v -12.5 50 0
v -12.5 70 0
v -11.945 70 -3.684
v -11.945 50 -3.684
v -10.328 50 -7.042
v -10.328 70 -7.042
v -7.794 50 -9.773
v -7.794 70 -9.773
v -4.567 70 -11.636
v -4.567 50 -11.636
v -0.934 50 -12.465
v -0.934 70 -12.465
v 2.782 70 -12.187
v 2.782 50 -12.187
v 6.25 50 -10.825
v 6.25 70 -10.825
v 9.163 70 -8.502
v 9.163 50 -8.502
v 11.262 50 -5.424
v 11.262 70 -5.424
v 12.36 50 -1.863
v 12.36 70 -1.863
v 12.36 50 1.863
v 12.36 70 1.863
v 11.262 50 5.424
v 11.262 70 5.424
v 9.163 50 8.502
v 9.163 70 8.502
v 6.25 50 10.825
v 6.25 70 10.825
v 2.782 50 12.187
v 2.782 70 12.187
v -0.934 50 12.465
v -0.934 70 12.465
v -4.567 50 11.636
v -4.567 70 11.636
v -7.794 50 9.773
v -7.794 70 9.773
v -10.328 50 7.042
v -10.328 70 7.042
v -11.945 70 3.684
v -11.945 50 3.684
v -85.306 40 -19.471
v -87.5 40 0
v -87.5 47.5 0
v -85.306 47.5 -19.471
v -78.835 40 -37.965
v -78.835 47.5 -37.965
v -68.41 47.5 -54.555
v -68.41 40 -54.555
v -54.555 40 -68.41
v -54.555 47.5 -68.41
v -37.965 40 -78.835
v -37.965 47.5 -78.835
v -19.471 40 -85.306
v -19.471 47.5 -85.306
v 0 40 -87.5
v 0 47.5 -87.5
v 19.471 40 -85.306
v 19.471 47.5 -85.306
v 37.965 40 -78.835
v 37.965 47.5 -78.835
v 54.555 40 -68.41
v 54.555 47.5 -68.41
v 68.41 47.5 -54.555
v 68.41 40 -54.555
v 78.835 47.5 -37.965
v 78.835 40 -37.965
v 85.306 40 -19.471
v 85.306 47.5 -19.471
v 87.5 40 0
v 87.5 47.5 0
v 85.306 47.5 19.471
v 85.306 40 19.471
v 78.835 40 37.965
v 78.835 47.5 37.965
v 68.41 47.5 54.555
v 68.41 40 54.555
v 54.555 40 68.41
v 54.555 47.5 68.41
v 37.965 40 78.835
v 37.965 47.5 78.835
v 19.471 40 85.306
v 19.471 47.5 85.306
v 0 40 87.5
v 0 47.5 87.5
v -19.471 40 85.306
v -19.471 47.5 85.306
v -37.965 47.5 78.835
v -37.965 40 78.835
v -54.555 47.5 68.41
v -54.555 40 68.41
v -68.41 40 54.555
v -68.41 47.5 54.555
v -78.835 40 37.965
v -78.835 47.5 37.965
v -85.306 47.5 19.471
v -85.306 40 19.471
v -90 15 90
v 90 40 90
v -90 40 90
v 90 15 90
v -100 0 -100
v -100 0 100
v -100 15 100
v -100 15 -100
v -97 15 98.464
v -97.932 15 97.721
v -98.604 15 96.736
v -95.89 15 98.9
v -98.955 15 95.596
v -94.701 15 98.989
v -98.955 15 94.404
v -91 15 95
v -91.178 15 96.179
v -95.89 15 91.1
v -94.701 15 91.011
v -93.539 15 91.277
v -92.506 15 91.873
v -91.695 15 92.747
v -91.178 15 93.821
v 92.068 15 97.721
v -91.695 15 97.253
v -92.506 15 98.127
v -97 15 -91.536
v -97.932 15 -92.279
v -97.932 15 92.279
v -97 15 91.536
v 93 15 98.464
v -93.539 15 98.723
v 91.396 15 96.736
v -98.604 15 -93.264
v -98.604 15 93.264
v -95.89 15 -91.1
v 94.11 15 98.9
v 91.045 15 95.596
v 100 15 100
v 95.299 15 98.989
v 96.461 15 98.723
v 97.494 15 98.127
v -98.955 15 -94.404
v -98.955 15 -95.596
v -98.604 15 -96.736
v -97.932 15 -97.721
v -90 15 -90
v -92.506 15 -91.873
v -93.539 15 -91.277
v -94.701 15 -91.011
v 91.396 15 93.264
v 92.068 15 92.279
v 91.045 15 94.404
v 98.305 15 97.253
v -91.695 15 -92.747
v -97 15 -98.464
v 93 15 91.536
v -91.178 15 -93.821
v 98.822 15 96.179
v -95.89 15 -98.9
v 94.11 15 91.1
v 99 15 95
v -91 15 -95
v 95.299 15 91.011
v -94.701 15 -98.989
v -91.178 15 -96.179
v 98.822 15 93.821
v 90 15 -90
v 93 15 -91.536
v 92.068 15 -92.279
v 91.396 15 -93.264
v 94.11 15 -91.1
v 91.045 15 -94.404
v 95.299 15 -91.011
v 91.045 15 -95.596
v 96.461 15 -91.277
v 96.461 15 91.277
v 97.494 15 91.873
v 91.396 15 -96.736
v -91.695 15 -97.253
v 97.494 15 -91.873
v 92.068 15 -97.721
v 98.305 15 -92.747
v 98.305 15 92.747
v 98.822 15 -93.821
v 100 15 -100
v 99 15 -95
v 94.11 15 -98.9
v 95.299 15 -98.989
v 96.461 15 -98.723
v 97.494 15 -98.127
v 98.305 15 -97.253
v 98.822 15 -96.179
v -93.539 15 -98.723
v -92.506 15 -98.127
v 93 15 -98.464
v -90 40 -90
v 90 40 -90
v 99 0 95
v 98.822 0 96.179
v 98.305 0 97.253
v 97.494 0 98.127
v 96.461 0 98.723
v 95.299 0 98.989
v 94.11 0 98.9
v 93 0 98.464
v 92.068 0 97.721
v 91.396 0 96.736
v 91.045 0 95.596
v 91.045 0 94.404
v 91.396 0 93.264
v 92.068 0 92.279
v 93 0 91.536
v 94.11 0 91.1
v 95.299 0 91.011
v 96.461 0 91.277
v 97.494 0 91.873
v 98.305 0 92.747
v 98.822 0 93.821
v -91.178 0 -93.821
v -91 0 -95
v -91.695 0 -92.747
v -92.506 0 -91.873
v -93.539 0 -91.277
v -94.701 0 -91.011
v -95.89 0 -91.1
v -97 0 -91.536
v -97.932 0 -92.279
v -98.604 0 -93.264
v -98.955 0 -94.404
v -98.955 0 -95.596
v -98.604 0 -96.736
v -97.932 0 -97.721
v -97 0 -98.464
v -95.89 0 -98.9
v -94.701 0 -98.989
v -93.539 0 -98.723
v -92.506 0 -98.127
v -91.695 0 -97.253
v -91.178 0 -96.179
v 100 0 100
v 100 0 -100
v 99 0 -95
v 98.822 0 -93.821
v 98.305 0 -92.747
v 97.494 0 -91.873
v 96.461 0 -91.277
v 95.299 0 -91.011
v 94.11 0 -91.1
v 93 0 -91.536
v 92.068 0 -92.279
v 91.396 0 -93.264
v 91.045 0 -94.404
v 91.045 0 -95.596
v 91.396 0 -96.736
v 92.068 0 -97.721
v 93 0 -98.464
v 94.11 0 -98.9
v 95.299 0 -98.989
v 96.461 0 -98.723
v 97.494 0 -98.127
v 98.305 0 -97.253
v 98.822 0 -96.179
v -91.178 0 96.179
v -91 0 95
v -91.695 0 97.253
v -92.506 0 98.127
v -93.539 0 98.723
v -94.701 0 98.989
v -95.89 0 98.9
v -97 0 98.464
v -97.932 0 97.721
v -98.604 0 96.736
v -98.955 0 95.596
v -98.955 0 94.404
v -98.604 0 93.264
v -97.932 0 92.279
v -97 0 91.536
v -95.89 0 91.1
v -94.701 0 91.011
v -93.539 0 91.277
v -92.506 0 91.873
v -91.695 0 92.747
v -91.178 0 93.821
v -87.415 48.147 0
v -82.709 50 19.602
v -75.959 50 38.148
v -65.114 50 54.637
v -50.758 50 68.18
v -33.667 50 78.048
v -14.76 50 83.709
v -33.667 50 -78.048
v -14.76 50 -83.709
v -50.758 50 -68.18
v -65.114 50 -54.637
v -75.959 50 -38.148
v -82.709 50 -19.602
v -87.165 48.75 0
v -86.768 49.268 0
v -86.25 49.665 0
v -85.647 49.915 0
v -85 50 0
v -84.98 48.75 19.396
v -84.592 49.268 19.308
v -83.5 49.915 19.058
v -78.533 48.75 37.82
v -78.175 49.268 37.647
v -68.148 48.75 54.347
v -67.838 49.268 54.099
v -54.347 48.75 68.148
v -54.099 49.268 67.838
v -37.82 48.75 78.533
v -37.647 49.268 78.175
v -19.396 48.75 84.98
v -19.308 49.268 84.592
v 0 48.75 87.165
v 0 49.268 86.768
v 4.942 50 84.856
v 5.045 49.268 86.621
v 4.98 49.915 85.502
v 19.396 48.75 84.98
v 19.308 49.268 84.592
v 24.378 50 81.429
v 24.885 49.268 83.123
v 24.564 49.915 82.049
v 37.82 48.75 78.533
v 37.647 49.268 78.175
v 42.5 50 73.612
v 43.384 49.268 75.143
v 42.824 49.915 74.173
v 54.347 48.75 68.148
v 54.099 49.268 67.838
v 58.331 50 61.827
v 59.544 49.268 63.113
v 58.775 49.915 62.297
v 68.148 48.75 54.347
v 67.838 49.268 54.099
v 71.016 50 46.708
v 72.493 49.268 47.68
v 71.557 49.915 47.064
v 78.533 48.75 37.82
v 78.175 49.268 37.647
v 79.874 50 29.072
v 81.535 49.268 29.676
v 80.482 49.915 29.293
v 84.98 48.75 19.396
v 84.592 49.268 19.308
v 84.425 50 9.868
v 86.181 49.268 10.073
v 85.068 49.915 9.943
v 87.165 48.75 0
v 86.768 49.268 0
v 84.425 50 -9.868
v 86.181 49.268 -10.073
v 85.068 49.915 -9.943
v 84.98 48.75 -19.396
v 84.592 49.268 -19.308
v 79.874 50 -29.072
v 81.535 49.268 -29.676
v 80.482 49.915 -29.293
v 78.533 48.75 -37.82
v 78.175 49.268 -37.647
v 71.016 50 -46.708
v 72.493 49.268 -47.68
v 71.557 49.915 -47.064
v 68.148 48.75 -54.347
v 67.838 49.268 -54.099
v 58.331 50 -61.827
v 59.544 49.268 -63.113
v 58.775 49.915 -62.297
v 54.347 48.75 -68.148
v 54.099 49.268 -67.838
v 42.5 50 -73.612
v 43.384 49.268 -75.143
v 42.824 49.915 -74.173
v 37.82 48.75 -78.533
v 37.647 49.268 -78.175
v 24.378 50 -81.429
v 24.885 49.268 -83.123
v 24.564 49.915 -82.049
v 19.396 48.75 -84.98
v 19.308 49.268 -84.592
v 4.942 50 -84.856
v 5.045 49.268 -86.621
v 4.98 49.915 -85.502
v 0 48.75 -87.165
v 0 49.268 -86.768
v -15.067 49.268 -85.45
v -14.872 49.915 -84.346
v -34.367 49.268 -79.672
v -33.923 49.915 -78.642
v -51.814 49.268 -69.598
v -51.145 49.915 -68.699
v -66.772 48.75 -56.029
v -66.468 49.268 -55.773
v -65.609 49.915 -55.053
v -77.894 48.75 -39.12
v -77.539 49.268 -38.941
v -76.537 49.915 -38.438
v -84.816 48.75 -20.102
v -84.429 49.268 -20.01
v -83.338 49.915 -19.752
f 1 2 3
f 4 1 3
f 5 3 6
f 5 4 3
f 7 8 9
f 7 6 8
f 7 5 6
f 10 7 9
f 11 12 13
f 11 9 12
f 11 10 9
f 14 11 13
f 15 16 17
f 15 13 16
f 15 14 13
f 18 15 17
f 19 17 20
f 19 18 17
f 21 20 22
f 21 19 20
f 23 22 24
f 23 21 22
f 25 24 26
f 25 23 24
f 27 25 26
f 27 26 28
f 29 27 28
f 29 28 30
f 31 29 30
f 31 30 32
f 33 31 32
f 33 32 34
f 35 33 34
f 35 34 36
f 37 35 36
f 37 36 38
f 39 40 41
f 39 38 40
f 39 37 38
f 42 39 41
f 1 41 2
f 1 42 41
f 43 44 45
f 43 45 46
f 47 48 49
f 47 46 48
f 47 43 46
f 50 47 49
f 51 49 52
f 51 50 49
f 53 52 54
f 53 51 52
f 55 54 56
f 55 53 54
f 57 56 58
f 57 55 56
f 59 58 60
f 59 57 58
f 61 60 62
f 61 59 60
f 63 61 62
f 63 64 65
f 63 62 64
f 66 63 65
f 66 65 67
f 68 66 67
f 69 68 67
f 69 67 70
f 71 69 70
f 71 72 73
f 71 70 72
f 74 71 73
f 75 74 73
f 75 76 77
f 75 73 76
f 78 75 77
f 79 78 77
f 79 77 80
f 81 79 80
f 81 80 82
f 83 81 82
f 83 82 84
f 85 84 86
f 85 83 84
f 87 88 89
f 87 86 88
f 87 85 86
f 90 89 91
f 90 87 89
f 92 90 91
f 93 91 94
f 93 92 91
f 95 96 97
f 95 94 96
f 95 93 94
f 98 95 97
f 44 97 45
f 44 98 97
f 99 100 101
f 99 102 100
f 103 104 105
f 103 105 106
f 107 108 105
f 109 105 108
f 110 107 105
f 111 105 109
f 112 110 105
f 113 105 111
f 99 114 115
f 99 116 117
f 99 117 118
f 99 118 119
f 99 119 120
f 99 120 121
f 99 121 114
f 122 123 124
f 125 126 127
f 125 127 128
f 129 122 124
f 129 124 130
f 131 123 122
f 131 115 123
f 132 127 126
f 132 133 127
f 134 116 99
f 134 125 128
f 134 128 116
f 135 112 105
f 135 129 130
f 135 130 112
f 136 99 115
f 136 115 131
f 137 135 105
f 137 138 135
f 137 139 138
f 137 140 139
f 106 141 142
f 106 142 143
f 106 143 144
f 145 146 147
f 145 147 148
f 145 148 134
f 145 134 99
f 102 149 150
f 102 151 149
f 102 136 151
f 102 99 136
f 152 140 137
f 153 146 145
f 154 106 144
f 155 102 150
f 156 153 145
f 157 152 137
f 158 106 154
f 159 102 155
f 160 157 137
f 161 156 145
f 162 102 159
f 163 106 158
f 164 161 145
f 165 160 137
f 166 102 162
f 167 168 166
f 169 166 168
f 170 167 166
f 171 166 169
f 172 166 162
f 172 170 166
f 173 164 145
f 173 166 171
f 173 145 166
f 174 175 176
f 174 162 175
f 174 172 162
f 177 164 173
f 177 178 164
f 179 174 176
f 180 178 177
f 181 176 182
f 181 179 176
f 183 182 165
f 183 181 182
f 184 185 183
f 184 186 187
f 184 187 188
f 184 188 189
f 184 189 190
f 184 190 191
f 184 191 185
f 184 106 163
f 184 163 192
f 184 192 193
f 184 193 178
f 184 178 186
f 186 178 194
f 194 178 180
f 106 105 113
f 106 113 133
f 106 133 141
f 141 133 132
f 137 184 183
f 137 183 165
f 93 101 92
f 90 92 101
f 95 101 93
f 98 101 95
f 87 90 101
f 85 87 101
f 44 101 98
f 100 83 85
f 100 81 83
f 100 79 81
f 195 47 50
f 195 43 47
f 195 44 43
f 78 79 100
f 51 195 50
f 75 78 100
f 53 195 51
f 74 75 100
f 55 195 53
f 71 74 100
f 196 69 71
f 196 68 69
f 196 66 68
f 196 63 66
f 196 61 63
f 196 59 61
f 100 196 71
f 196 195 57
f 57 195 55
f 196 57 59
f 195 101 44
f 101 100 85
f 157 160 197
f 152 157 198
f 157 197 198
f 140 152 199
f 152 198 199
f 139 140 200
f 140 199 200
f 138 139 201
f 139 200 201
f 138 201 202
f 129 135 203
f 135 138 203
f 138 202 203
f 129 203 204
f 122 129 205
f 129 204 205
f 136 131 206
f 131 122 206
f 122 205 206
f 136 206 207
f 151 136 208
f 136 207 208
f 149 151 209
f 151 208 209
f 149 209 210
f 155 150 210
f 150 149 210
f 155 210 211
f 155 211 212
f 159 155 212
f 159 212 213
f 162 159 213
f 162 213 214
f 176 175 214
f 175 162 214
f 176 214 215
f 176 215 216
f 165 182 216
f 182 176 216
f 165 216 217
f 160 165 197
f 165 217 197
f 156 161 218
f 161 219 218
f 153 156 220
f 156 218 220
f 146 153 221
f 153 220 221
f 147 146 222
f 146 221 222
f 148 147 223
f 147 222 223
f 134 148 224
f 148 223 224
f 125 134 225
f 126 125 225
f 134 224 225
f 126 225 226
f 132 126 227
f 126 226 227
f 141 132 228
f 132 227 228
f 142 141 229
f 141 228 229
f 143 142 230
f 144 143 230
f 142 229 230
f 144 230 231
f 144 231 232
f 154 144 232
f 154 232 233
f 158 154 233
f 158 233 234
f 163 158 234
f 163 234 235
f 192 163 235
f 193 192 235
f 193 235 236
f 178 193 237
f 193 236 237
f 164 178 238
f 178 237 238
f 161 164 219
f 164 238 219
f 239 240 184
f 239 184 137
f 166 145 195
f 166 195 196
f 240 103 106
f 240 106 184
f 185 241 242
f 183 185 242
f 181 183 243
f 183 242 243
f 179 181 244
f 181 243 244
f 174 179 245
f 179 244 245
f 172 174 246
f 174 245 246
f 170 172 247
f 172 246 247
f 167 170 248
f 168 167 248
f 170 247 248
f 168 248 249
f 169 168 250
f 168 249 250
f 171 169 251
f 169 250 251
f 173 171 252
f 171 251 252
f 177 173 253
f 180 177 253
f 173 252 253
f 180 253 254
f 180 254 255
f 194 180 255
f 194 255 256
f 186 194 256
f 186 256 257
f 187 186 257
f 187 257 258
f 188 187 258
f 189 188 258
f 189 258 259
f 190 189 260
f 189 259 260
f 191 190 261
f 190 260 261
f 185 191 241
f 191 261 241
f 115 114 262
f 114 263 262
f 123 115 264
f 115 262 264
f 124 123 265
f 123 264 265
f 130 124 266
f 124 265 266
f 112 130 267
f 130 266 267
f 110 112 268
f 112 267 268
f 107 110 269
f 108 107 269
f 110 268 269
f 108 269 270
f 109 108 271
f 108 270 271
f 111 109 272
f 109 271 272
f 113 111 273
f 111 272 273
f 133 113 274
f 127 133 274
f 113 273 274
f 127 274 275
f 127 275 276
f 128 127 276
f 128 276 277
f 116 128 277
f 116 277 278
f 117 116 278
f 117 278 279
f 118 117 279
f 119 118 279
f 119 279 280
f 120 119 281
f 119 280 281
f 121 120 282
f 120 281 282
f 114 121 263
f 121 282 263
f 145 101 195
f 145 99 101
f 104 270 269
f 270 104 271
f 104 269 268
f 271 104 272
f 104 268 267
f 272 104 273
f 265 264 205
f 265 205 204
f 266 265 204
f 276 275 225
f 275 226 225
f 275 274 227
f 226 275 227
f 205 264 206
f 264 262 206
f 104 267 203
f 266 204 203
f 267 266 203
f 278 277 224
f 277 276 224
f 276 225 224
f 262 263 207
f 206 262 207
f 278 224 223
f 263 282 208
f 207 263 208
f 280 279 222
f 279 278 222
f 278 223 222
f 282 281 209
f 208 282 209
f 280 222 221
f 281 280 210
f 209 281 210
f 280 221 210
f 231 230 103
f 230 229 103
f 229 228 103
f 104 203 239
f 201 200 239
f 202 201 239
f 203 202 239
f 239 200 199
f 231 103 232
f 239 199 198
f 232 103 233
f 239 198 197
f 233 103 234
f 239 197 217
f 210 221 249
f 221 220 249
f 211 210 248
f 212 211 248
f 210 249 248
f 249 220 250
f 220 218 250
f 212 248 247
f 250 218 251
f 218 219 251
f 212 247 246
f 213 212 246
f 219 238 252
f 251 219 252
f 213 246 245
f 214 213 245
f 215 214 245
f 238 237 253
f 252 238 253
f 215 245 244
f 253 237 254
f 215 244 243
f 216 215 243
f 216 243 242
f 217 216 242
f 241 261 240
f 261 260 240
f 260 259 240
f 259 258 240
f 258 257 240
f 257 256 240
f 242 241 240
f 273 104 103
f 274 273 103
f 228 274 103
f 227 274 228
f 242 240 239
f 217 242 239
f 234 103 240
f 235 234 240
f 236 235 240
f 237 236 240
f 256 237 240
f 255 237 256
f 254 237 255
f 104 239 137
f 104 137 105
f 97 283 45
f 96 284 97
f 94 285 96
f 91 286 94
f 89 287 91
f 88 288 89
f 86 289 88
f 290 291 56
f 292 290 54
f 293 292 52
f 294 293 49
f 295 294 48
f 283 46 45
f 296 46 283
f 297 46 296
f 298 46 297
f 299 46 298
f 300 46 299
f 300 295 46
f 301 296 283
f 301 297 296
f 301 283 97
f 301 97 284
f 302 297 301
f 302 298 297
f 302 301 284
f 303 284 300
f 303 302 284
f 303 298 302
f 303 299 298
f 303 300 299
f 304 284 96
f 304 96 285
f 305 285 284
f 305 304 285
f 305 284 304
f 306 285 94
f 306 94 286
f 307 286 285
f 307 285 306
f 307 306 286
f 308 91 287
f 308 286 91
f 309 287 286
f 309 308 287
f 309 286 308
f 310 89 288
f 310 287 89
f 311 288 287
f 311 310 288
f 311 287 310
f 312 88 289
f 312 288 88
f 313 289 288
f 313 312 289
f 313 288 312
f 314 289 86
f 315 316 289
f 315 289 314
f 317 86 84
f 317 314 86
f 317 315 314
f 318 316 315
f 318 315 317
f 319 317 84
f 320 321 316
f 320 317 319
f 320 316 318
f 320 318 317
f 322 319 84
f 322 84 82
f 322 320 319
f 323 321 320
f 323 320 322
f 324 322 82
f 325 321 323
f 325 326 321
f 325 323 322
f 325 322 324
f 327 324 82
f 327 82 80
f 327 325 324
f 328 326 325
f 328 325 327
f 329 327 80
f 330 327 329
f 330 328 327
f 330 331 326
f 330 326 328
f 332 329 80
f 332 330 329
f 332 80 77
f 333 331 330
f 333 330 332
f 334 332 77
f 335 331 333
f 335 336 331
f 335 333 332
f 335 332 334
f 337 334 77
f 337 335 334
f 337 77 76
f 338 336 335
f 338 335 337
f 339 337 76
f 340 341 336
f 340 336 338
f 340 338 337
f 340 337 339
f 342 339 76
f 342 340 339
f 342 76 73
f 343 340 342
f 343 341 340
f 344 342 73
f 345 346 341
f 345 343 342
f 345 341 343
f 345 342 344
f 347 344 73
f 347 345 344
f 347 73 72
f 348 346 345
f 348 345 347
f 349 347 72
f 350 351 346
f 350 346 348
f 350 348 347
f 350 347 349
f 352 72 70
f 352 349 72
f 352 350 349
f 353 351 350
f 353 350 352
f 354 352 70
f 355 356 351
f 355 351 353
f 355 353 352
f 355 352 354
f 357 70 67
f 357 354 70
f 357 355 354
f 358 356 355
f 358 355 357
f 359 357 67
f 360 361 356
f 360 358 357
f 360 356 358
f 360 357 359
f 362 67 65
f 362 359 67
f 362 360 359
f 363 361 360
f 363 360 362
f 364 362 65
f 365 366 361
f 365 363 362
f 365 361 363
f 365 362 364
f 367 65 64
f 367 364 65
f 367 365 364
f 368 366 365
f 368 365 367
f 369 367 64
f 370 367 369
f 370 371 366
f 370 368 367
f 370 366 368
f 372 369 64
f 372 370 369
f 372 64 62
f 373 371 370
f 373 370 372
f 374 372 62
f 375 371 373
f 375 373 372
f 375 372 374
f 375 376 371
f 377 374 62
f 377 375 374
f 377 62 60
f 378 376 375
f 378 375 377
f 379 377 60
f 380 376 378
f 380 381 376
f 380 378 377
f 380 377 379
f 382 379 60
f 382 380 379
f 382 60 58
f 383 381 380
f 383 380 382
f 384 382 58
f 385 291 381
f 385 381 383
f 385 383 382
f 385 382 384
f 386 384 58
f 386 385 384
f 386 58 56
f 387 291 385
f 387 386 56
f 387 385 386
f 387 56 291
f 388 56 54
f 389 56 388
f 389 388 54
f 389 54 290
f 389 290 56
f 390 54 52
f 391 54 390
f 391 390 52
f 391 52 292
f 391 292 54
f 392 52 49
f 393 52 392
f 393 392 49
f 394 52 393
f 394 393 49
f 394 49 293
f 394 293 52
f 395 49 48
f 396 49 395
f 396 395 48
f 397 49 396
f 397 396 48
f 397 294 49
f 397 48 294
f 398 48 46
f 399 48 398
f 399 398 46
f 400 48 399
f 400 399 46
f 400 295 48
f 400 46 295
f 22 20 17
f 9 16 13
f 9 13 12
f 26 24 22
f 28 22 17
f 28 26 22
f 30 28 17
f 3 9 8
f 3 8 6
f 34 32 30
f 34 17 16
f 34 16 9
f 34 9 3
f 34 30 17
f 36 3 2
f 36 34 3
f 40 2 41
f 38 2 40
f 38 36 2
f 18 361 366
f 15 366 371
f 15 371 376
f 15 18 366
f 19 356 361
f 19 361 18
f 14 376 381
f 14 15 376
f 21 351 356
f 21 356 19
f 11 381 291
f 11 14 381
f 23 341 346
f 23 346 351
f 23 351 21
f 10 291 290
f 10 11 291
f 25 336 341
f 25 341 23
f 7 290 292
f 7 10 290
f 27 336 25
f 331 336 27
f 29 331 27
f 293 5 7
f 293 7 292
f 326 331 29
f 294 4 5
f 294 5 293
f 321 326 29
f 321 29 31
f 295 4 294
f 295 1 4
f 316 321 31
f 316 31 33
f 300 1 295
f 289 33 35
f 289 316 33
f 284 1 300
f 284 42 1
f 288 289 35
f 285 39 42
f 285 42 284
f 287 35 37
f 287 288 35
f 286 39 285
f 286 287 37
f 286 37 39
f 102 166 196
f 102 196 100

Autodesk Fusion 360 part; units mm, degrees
sketch "Sketch1" plane through (0, 0, 0) normal (0, 1, 0) x (1, 0, 0)
  line L0 (90, -90) -> (-90, -90)
  line L1 (-90, -90) -> (-90, 90)
  line L2 (-90, 90) -> (90, 90)
  line L3 (90, 90) -> (90, -90)
  line L4 (90, -90) -> (-90, 90) construction
  line L5 (-90, -90) -> (90, 90) construction
  line L6 (100, -100) -> (-100, -100)
  line L7 (-100, -100) -> (-100, 100)
  line L8 (-100, 100) -> (100, 100)
  line L9 (100, 100) -> (100, -100)
  line L10 (100, -100) -> (-100, 100) construction
  line L11 (-100, -100) -> (100, 100) construction
  line L12 (-100, 100) -> (-90, 90)
  line L13 (100, 100) -> (90, 90)
  line L14 (90, -90) -> (100, -100)
  line L15 (-90, -90) -> (-100, -100)
  circle A0 centre (-95, -95) radius 4
  circle A1 centre (-95, 95) radius 4
  circle A2 centre (95, 95) radius 4
  circle A3 centre (95, -95) radius 4
  dimension "d3" = 180
  dimension "d4" = 180
  dimension "d5" = 200
  dimension "d6" = 200
  dimension "d7" = 8
  dimension "d8" = 8
  dimension "d9" = 8
  dimension "d10" = 8
extrude "Extrude1" add sketch "Sketch1" along normal blind 40 contours L0 L1 L2 L3
extrude "Extrude2" add sketch "Sketch1" along normal blind 15 contours L0 L6 L14 L15 A0 A3 | L3 L9 L13 L14 A2 A3 | L1 L7 L12 L15 A0 A1 | L2 L8 L12 L13 A1 A2
sketch "Sketch2" plane through (0, 40, 0) normal (0, 1, 0) x (-1, 0, 0)
  line L0 (-90, -90) -> (90, -90)
  line L1 (90, -90) -> (90, 90)
  line L2 (90, 90) -> (-90, 90)
  line L3 (-90, 90) -> (-90, -90)
  circle A0 centre (0, 0) radius 87.5
  circle A1 centre (0, 0) radius 12.5
  dimension "d15" = 175
  dimension "d16" = 25
extrude "Extrude3" add sketch "Sketch2" along normal blind 30 contours A1
extrude "Extrude4" add sketch "Sketch2" along normal blind 10 contours A0
fillet "Fillet1" radius 2.5 1 edges at (81.5786, 50, -31.6414)
sketch "Sketch3" plane through (0, 50, 0) normal (0, 1, 0) x (-1, 0, 0)
  circle A0 centre (0, 0) radius 12.5
  circle A1 centre (0, 0) radius 85
